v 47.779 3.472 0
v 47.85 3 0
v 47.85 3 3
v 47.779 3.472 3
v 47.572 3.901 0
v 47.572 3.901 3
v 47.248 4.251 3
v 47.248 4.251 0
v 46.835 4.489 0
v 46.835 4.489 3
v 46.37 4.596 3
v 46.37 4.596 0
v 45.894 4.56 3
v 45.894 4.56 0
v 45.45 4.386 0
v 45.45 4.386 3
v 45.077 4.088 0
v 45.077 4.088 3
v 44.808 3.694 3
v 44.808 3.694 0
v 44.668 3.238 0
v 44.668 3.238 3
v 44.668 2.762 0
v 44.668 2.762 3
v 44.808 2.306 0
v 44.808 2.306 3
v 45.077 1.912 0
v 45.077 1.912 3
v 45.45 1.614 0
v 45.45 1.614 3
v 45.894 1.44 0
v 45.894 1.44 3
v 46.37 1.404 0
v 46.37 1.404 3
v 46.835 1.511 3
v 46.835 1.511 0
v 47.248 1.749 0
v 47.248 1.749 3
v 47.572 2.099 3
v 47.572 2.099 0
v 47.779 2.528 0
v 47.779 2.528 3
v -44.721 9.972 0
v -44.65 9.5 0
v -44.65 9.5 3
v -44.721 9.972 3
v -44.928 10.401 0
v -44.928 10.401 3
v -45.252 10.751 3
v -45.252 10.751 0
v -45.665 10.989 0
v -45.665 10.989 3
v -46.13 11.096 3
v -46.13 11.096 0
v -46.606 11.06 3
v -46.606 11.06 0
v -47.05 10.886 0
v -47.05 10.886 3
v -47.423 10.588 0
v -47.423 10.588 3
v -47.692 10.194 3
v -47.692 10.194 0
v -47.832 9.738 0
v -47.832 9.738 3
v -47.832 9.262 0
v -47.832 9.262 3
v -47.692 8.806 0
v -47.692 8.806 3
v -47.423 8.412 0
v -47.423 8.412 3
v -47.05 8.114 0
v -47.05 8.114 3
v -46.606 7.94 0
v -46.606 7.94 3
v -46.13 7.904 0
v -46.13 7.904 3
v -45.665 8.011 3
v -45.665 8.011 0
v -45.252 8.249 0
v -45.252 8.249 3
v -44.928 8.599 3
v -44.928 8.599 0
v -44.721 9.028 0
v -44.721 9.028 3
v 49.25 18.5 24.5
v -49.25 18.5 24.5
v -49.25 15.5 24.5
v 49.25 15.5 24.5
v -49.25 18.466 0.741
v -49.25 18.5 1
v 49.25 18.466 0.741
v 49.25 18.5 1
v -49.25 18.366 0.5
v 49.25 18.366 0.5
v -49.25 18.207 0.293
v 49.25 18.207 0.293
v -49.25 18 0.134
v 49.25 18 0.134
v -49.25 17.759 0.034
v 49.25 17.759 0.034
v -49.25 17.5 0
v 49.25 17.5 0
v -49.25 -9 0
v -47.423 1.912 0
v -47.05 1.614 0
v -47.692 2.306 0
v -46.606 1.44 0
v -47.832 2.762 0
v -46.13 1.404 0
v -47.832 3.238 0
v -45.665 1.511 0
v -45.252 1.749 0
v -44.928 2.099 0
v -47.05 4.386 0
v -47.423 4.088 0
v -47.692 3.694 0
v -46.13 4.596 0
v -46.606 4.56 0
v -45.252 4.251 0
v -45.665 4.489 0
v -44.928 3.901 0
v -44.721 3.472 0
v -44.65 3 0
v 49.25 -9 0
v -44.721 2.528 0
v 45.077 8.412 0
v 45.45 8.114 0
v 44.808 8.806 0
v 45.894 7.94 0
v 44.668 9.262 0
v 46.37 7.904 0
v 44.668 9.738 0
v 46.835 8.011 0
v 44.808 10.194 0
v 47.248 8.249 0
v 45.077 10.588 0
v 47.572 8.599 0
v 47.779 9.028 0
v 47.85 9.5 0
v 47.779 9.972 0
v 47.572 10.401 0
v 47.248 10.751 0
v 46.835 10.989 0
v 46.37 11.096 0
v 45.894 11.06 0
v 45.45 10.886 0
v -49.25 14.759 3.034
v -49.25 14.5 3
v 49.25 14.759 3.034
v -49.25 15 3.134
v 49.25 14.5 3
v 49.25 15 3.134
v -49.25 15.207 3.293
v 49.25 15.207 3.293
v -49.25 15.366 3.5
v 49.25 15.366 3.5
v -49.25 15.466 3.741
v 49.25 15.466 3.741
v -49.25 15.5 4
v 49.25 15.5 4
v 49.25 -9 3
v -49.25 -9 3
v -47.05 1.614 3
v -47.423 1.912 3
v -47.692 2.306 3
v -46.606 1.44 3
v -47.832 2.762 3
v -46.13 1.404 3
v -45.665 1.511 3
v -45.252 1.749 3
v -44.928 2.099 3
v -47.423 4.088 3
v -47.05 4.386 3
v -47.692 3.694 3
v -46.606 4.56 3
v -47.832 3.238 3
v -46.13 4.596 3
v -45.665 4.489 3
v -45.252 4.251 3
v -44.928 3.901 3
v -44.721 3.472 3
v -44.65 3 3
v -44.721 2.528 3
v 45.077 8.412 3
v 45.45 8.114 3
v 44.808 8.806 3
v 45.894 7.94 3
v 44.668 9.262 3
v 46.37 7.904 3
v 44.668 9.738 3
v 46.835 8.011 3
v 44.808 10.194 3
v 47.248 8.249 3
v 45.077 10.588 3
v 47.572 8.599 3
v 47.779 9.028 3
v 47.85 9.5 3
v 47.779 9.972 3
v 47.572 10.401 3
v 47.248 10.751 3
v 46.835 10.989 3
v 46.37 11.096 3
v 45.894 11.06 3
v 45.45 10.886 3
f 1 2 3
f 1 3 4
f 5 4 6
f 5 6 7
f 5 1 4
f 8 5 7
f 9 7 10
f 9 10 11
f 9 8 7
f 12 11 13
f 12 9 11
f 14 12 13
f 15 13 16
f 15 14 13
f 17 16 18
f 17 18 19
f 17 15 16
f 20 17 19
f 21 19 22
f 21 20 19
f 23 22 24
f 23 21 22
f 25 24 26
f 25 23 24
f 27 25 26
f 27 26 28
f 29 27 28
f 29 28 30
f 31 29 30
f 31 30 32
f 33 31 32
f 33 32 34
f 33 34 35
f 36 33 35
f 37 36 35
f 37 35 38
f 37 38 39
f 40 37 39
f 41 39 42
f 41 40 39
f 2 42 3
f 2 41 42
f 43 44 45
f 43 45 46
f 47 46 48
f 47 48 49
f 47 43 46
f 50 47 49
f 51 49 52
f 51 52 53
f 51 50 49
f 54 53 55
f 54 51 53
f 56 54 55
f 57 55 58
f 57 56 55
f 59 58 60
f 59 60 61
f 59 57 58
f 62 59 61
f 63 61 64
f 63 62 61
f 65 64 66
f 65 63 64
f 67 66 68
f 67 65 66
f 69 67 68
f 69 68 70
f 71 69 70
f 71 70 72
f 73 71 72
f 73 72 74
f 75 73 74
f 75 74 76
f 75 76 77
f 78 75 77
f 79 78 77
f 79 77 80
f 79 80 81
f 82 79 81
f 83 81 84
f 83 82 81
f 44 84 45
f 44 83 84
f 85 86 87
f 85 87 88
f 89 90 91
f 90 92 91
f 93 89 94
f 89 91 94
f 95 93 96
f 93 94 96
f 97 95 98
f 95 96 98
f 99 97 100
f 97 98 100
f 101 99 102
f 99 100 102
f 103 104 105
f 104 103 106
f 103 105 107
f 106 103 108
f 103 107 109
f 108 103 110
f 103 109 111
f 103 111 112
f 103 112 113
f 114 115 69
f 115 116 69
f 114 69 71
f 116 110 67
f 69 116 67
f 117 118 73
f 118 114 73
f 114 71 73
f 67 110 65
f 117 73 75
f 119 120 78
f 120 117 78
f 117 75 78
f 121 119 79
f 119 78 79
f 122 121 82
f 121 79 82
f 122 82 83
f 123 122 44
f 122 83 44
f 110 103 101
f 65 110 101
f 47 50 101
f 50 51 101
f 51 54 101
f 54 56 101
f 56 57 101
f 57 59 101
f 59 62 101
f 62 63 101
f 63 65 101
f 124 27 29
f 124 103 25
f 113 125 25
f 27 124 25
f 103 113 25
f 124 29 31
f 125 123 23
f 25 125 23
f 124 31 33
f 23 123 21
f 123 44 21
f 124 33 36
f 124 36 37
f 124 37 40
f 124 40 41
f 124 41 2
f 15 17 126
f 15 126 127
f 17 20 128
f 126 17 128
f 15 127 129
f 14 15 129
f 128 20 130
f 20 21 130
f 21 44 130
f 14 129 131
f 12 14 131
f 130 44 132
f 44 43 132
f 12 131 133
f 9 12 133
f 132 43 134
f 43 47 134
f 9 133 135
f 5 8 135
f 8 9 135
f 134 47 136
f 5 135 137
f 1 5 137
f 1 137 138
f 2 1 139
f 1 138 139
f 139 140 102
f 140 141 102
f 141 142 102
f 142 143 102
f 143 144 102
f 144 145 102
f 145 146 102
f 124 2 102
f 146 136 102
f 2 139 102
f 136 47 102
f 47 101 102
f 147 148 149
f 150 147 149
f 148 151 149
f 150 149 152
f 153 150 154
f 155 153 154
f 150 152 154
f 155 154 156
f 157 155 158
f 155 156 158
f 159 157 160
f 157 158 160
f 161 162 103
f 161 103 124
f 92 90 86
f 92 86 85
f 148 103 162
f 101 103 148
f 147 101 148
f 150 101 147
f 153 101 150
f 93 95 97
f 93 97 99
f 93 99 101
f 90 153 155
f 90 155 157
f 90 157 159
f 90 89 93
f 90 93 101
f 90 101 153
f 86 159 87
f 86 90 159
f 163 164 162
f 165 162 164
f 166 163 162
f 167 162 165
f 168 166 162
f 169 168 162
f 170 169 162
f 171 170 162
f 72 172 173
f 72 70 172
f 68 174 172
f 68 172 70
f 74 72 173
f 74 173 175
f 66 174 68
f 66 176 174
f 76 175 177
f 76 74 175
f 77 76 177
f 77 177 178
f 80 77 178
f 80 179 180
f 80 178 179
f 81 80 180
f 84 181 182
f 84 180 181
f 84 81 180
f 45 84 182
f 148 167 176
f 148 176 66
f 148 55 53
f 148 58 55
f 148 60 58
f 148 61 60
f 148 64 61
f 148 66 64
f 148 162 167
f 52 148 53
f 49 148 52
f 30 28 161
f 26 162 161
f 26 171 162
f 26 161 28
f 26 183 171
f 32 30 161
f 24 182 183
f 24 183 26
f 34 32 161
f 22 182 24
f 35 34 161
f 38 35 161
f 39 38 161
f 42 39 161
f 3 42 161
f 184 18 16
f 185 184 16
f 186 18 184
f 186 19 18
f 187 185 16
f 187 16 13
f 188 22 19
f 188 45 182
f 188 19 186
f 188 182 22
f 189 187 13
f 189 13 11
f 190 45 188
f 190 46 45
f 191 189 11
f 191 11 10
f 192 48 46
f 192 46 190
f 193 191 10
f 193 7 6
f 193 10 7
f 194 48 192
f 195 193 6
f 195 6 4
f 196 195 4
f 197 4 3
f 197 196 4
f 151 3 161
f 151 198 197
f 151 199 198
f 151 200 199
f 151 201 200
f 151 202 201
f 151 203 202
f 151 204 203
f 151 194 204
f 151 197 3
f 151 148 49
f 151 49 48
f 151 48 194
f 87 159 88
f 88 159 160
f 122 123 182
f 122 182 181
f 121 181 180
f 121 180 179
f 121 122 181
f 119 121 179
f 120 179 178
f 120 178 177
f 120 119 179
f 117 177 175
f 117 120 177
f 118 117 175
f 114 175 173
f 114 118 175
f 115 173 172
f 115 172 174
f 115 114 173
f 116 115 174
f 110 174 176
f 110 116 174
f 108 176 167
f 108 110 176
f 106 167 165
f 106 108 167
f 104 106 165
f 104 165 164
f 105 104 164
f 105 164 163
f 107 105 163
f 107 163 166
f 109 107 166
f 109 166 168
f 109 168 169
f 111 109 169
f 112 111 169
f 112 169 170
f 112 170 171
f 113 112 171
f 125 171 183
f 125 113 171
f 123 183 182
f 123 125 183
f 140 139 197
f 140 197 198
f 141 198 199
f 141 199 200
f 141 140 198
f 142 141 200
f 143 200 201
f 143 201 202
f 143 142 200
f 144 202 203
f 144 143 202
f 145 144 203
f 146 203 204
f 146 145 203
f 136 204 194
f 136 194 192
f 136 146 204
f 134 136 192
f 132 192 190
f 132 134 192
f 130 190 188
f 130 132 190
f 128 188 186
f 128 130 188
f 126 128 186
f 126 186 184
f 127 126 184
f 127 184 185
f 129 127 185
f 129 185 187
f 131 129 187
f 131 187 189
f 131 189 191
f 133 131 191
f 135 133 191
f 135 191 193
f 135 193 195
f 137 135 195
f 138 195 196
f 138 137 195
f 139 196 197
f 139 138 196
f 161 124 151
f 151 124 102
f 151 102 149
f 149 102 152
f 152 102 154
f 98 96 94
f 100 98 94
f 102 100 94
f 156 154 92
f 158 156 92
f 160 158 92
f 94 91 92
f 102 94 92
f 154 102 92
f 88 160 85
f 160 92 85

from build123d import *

# Parameters (mm, degrees)
SKETCH_1_W      = 98.5
SKETCH_1_H      = 18.5
SKETCH_1_R      = 1.6
EXTRUDE_1_DEPTH = 3
SKETCH_2_W      = 98.5
SKETCH_2_H      = 21.5
EXTRUDE_2_DEPTH = 3
FILLET_1_R      = 1
SKETCH_3_W      = 98.5
SKETCH_3_H      = 3
EXTRUDE_3_DEPTH = 9


with BuildPart() as part:
    # 草图1 → 凸台-拉伸1 (new body)
    with BuildSketch(Plane.XY):
        with Locations((0, 9.25)):
            Rectangle(SKETCH_1_W, SKETCH_1_H)
        with Locations((-46.25, 3)):
            Circle(SKETCH_1_R, mode=Mode.SUBTRACT)
        with Locations((-46.25, 9.5)):
            Circle(SKETCH_1_R, mode=Mode.SUBTRACT)
        with Locations((46.25, 3)):
            Circle(SKETCH_1_R, mode=Mode.SUBTRACT)
        with Locations((46.25, 9.5)):
            Circle(SKETCH_1_R, mode=Mode.SUBTRACT)
    extrude(amount=EXTRUDE_1_DEPTH)

    # 草图2 → 凸台-拉伸2 (add)
    with BuildSketch(Plane(origin=(0, 18.5, 0), x_dir=(1, 0, 0), z_dir=(0, 1, 0))):
        with Locations((0, -13.75)):
            Rectangle(SKETCH_2_W, SKETCH_2_H)
    extrude(amount=-EXTRUDE_2_DEPTH)

    # 圆角1
    fillet_1_edges = [part.edges().sort_by_distance(p)[0] for p in [
        (0, 15.5, 3),
        (0, 18.5, 0),
    ]]
    fillet(fillet_1_edges, radius=FILLET_1_R)

    # 草图3 → 凸台-拉伸3 (add)
    with BuildSketch(Plane.XZ):
        with Locations((0, 1.5)):
            Rectangle(SKETCH_3_W, SKETCH_3_H)
    extrude(amount=EXTRUDE_3_DEPTH)


solid = part.part
